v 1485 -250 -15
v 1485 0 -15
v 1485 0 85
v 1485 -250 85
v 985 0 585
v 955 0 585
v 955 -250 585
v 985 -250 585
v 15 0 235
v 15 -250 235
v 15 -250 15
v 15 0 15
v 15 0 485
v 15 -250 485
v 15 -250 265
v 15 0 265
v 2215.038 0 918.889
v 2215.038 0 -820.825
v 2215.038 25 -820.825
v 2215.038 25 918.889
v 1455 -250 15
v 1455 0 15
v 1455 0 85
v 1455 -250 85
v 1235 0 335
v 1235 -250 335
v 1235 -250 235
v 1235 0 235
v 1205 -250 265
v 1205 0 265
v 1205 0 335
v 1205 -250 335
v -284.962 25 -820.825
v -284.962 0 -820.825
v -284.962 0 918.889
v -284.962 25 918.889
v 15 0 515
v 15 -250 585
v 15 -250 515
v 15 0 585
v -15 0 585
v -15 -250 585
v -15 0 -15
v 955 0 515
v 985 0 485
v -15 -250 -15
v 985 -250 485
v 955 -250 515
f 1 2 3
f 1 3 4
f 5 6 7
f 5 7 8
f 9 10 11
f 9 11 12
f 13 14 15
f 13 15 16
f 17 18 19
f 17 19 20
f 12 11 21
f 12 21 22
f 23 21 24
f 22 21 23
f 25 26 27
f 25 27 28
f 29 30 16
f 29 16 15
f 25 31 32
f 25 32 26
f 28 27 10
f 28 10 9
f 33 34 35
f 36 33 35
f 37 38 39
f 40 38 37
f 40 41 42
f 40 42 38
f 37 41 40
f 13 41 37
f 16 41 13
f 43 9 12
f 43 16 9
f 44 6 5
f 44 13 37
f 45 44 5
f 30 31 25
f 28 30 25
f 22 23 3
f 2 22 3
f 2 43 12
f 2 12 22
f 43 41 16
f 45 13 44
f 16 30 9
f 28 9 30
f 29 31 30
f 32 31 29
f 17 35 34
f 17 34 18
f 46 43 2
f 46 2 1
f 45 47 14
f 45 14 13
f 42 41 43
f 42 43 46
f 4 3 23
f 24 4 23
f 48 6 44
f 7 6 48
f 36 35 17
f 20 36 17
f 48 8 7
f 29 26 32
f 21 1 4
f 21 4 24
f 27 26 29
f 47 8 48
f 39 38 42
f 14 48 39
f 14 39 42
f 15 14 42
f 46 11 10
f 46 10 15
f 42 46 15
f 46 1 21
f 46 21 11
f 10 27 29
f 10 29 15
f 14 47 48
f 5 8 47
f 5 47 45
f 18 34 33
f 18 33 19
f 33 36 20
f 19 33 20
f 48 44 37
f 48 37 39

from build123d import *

# Parameters (mm, degrees)
F0_W     = 2500
F0_H     = 1739.7141116797
F1_DEPTH = 25
F3_W     = 30
F3_H     = 250


with BuildPart() as f1:
    # F0 (on Front) → F1 (new body)
    with BuildSketch(Plane.XZ):
        with Locations((965.0375247002, 49.0323135227)):
            Rectangle(F0_W, F0_H)
    extrude(amount=-F1_DEPTH)


with BuildPart() as f4:
    # F4: sweep along a path in F2
    with BuildLine(Plane.XZ) as f4_path:
        Line((1470, 85), (1470, 0))
        Line((1470, 0), (0, 0))
        Line((0, 0), (0, 250))
        Line((0, 250), (0, 500))
        Line((0, 500), (0, 585))
    # F3 (on Top) → F4 (sweep)
    with BuildSketch(Plane.XY):
        with Locations((0, -125)):
            Rectangle(F3_W, F3_H)
    sweep(path=f4_path.line, transition=Transition.RIGHT)

    # F5: sweep along a path in F2
    with BuildLine(Plane.XZ) as f5_path:
        Line((0, 0), (0, 250))
        Line((0, 250), (1220, 250))
        Line((1220, 250), (1220, 335))
    # F3 (on Top) → F5 (sweep)
    with BuildSketch(Plane.XY):
        with Locations((0, -125)):
            Rectangle(F3_W, F3_H)
    sweep(path=f5_path.line, transition=Transition.RIGHT)

    # F6: sweep along a path in F2
    with BuildLine(Plane.XZ) as f6_path:
        Line((0, 0), (0, 250))
        Line((0, 250), (0, 500))
        Line((0, 500), (970, 500))
        Line((970, 500), (970, 585))
    # F3 (on Top) → F6 (sweep)
    with BuildSketch(Plane.XY):
        with Locations((0, -125)):
            Rectangle(F3_W, F3_H)
    sweep(path=f6_path.line, transition=Transition.RIGHT)


solid = Compound([f1.part, f4.part])
